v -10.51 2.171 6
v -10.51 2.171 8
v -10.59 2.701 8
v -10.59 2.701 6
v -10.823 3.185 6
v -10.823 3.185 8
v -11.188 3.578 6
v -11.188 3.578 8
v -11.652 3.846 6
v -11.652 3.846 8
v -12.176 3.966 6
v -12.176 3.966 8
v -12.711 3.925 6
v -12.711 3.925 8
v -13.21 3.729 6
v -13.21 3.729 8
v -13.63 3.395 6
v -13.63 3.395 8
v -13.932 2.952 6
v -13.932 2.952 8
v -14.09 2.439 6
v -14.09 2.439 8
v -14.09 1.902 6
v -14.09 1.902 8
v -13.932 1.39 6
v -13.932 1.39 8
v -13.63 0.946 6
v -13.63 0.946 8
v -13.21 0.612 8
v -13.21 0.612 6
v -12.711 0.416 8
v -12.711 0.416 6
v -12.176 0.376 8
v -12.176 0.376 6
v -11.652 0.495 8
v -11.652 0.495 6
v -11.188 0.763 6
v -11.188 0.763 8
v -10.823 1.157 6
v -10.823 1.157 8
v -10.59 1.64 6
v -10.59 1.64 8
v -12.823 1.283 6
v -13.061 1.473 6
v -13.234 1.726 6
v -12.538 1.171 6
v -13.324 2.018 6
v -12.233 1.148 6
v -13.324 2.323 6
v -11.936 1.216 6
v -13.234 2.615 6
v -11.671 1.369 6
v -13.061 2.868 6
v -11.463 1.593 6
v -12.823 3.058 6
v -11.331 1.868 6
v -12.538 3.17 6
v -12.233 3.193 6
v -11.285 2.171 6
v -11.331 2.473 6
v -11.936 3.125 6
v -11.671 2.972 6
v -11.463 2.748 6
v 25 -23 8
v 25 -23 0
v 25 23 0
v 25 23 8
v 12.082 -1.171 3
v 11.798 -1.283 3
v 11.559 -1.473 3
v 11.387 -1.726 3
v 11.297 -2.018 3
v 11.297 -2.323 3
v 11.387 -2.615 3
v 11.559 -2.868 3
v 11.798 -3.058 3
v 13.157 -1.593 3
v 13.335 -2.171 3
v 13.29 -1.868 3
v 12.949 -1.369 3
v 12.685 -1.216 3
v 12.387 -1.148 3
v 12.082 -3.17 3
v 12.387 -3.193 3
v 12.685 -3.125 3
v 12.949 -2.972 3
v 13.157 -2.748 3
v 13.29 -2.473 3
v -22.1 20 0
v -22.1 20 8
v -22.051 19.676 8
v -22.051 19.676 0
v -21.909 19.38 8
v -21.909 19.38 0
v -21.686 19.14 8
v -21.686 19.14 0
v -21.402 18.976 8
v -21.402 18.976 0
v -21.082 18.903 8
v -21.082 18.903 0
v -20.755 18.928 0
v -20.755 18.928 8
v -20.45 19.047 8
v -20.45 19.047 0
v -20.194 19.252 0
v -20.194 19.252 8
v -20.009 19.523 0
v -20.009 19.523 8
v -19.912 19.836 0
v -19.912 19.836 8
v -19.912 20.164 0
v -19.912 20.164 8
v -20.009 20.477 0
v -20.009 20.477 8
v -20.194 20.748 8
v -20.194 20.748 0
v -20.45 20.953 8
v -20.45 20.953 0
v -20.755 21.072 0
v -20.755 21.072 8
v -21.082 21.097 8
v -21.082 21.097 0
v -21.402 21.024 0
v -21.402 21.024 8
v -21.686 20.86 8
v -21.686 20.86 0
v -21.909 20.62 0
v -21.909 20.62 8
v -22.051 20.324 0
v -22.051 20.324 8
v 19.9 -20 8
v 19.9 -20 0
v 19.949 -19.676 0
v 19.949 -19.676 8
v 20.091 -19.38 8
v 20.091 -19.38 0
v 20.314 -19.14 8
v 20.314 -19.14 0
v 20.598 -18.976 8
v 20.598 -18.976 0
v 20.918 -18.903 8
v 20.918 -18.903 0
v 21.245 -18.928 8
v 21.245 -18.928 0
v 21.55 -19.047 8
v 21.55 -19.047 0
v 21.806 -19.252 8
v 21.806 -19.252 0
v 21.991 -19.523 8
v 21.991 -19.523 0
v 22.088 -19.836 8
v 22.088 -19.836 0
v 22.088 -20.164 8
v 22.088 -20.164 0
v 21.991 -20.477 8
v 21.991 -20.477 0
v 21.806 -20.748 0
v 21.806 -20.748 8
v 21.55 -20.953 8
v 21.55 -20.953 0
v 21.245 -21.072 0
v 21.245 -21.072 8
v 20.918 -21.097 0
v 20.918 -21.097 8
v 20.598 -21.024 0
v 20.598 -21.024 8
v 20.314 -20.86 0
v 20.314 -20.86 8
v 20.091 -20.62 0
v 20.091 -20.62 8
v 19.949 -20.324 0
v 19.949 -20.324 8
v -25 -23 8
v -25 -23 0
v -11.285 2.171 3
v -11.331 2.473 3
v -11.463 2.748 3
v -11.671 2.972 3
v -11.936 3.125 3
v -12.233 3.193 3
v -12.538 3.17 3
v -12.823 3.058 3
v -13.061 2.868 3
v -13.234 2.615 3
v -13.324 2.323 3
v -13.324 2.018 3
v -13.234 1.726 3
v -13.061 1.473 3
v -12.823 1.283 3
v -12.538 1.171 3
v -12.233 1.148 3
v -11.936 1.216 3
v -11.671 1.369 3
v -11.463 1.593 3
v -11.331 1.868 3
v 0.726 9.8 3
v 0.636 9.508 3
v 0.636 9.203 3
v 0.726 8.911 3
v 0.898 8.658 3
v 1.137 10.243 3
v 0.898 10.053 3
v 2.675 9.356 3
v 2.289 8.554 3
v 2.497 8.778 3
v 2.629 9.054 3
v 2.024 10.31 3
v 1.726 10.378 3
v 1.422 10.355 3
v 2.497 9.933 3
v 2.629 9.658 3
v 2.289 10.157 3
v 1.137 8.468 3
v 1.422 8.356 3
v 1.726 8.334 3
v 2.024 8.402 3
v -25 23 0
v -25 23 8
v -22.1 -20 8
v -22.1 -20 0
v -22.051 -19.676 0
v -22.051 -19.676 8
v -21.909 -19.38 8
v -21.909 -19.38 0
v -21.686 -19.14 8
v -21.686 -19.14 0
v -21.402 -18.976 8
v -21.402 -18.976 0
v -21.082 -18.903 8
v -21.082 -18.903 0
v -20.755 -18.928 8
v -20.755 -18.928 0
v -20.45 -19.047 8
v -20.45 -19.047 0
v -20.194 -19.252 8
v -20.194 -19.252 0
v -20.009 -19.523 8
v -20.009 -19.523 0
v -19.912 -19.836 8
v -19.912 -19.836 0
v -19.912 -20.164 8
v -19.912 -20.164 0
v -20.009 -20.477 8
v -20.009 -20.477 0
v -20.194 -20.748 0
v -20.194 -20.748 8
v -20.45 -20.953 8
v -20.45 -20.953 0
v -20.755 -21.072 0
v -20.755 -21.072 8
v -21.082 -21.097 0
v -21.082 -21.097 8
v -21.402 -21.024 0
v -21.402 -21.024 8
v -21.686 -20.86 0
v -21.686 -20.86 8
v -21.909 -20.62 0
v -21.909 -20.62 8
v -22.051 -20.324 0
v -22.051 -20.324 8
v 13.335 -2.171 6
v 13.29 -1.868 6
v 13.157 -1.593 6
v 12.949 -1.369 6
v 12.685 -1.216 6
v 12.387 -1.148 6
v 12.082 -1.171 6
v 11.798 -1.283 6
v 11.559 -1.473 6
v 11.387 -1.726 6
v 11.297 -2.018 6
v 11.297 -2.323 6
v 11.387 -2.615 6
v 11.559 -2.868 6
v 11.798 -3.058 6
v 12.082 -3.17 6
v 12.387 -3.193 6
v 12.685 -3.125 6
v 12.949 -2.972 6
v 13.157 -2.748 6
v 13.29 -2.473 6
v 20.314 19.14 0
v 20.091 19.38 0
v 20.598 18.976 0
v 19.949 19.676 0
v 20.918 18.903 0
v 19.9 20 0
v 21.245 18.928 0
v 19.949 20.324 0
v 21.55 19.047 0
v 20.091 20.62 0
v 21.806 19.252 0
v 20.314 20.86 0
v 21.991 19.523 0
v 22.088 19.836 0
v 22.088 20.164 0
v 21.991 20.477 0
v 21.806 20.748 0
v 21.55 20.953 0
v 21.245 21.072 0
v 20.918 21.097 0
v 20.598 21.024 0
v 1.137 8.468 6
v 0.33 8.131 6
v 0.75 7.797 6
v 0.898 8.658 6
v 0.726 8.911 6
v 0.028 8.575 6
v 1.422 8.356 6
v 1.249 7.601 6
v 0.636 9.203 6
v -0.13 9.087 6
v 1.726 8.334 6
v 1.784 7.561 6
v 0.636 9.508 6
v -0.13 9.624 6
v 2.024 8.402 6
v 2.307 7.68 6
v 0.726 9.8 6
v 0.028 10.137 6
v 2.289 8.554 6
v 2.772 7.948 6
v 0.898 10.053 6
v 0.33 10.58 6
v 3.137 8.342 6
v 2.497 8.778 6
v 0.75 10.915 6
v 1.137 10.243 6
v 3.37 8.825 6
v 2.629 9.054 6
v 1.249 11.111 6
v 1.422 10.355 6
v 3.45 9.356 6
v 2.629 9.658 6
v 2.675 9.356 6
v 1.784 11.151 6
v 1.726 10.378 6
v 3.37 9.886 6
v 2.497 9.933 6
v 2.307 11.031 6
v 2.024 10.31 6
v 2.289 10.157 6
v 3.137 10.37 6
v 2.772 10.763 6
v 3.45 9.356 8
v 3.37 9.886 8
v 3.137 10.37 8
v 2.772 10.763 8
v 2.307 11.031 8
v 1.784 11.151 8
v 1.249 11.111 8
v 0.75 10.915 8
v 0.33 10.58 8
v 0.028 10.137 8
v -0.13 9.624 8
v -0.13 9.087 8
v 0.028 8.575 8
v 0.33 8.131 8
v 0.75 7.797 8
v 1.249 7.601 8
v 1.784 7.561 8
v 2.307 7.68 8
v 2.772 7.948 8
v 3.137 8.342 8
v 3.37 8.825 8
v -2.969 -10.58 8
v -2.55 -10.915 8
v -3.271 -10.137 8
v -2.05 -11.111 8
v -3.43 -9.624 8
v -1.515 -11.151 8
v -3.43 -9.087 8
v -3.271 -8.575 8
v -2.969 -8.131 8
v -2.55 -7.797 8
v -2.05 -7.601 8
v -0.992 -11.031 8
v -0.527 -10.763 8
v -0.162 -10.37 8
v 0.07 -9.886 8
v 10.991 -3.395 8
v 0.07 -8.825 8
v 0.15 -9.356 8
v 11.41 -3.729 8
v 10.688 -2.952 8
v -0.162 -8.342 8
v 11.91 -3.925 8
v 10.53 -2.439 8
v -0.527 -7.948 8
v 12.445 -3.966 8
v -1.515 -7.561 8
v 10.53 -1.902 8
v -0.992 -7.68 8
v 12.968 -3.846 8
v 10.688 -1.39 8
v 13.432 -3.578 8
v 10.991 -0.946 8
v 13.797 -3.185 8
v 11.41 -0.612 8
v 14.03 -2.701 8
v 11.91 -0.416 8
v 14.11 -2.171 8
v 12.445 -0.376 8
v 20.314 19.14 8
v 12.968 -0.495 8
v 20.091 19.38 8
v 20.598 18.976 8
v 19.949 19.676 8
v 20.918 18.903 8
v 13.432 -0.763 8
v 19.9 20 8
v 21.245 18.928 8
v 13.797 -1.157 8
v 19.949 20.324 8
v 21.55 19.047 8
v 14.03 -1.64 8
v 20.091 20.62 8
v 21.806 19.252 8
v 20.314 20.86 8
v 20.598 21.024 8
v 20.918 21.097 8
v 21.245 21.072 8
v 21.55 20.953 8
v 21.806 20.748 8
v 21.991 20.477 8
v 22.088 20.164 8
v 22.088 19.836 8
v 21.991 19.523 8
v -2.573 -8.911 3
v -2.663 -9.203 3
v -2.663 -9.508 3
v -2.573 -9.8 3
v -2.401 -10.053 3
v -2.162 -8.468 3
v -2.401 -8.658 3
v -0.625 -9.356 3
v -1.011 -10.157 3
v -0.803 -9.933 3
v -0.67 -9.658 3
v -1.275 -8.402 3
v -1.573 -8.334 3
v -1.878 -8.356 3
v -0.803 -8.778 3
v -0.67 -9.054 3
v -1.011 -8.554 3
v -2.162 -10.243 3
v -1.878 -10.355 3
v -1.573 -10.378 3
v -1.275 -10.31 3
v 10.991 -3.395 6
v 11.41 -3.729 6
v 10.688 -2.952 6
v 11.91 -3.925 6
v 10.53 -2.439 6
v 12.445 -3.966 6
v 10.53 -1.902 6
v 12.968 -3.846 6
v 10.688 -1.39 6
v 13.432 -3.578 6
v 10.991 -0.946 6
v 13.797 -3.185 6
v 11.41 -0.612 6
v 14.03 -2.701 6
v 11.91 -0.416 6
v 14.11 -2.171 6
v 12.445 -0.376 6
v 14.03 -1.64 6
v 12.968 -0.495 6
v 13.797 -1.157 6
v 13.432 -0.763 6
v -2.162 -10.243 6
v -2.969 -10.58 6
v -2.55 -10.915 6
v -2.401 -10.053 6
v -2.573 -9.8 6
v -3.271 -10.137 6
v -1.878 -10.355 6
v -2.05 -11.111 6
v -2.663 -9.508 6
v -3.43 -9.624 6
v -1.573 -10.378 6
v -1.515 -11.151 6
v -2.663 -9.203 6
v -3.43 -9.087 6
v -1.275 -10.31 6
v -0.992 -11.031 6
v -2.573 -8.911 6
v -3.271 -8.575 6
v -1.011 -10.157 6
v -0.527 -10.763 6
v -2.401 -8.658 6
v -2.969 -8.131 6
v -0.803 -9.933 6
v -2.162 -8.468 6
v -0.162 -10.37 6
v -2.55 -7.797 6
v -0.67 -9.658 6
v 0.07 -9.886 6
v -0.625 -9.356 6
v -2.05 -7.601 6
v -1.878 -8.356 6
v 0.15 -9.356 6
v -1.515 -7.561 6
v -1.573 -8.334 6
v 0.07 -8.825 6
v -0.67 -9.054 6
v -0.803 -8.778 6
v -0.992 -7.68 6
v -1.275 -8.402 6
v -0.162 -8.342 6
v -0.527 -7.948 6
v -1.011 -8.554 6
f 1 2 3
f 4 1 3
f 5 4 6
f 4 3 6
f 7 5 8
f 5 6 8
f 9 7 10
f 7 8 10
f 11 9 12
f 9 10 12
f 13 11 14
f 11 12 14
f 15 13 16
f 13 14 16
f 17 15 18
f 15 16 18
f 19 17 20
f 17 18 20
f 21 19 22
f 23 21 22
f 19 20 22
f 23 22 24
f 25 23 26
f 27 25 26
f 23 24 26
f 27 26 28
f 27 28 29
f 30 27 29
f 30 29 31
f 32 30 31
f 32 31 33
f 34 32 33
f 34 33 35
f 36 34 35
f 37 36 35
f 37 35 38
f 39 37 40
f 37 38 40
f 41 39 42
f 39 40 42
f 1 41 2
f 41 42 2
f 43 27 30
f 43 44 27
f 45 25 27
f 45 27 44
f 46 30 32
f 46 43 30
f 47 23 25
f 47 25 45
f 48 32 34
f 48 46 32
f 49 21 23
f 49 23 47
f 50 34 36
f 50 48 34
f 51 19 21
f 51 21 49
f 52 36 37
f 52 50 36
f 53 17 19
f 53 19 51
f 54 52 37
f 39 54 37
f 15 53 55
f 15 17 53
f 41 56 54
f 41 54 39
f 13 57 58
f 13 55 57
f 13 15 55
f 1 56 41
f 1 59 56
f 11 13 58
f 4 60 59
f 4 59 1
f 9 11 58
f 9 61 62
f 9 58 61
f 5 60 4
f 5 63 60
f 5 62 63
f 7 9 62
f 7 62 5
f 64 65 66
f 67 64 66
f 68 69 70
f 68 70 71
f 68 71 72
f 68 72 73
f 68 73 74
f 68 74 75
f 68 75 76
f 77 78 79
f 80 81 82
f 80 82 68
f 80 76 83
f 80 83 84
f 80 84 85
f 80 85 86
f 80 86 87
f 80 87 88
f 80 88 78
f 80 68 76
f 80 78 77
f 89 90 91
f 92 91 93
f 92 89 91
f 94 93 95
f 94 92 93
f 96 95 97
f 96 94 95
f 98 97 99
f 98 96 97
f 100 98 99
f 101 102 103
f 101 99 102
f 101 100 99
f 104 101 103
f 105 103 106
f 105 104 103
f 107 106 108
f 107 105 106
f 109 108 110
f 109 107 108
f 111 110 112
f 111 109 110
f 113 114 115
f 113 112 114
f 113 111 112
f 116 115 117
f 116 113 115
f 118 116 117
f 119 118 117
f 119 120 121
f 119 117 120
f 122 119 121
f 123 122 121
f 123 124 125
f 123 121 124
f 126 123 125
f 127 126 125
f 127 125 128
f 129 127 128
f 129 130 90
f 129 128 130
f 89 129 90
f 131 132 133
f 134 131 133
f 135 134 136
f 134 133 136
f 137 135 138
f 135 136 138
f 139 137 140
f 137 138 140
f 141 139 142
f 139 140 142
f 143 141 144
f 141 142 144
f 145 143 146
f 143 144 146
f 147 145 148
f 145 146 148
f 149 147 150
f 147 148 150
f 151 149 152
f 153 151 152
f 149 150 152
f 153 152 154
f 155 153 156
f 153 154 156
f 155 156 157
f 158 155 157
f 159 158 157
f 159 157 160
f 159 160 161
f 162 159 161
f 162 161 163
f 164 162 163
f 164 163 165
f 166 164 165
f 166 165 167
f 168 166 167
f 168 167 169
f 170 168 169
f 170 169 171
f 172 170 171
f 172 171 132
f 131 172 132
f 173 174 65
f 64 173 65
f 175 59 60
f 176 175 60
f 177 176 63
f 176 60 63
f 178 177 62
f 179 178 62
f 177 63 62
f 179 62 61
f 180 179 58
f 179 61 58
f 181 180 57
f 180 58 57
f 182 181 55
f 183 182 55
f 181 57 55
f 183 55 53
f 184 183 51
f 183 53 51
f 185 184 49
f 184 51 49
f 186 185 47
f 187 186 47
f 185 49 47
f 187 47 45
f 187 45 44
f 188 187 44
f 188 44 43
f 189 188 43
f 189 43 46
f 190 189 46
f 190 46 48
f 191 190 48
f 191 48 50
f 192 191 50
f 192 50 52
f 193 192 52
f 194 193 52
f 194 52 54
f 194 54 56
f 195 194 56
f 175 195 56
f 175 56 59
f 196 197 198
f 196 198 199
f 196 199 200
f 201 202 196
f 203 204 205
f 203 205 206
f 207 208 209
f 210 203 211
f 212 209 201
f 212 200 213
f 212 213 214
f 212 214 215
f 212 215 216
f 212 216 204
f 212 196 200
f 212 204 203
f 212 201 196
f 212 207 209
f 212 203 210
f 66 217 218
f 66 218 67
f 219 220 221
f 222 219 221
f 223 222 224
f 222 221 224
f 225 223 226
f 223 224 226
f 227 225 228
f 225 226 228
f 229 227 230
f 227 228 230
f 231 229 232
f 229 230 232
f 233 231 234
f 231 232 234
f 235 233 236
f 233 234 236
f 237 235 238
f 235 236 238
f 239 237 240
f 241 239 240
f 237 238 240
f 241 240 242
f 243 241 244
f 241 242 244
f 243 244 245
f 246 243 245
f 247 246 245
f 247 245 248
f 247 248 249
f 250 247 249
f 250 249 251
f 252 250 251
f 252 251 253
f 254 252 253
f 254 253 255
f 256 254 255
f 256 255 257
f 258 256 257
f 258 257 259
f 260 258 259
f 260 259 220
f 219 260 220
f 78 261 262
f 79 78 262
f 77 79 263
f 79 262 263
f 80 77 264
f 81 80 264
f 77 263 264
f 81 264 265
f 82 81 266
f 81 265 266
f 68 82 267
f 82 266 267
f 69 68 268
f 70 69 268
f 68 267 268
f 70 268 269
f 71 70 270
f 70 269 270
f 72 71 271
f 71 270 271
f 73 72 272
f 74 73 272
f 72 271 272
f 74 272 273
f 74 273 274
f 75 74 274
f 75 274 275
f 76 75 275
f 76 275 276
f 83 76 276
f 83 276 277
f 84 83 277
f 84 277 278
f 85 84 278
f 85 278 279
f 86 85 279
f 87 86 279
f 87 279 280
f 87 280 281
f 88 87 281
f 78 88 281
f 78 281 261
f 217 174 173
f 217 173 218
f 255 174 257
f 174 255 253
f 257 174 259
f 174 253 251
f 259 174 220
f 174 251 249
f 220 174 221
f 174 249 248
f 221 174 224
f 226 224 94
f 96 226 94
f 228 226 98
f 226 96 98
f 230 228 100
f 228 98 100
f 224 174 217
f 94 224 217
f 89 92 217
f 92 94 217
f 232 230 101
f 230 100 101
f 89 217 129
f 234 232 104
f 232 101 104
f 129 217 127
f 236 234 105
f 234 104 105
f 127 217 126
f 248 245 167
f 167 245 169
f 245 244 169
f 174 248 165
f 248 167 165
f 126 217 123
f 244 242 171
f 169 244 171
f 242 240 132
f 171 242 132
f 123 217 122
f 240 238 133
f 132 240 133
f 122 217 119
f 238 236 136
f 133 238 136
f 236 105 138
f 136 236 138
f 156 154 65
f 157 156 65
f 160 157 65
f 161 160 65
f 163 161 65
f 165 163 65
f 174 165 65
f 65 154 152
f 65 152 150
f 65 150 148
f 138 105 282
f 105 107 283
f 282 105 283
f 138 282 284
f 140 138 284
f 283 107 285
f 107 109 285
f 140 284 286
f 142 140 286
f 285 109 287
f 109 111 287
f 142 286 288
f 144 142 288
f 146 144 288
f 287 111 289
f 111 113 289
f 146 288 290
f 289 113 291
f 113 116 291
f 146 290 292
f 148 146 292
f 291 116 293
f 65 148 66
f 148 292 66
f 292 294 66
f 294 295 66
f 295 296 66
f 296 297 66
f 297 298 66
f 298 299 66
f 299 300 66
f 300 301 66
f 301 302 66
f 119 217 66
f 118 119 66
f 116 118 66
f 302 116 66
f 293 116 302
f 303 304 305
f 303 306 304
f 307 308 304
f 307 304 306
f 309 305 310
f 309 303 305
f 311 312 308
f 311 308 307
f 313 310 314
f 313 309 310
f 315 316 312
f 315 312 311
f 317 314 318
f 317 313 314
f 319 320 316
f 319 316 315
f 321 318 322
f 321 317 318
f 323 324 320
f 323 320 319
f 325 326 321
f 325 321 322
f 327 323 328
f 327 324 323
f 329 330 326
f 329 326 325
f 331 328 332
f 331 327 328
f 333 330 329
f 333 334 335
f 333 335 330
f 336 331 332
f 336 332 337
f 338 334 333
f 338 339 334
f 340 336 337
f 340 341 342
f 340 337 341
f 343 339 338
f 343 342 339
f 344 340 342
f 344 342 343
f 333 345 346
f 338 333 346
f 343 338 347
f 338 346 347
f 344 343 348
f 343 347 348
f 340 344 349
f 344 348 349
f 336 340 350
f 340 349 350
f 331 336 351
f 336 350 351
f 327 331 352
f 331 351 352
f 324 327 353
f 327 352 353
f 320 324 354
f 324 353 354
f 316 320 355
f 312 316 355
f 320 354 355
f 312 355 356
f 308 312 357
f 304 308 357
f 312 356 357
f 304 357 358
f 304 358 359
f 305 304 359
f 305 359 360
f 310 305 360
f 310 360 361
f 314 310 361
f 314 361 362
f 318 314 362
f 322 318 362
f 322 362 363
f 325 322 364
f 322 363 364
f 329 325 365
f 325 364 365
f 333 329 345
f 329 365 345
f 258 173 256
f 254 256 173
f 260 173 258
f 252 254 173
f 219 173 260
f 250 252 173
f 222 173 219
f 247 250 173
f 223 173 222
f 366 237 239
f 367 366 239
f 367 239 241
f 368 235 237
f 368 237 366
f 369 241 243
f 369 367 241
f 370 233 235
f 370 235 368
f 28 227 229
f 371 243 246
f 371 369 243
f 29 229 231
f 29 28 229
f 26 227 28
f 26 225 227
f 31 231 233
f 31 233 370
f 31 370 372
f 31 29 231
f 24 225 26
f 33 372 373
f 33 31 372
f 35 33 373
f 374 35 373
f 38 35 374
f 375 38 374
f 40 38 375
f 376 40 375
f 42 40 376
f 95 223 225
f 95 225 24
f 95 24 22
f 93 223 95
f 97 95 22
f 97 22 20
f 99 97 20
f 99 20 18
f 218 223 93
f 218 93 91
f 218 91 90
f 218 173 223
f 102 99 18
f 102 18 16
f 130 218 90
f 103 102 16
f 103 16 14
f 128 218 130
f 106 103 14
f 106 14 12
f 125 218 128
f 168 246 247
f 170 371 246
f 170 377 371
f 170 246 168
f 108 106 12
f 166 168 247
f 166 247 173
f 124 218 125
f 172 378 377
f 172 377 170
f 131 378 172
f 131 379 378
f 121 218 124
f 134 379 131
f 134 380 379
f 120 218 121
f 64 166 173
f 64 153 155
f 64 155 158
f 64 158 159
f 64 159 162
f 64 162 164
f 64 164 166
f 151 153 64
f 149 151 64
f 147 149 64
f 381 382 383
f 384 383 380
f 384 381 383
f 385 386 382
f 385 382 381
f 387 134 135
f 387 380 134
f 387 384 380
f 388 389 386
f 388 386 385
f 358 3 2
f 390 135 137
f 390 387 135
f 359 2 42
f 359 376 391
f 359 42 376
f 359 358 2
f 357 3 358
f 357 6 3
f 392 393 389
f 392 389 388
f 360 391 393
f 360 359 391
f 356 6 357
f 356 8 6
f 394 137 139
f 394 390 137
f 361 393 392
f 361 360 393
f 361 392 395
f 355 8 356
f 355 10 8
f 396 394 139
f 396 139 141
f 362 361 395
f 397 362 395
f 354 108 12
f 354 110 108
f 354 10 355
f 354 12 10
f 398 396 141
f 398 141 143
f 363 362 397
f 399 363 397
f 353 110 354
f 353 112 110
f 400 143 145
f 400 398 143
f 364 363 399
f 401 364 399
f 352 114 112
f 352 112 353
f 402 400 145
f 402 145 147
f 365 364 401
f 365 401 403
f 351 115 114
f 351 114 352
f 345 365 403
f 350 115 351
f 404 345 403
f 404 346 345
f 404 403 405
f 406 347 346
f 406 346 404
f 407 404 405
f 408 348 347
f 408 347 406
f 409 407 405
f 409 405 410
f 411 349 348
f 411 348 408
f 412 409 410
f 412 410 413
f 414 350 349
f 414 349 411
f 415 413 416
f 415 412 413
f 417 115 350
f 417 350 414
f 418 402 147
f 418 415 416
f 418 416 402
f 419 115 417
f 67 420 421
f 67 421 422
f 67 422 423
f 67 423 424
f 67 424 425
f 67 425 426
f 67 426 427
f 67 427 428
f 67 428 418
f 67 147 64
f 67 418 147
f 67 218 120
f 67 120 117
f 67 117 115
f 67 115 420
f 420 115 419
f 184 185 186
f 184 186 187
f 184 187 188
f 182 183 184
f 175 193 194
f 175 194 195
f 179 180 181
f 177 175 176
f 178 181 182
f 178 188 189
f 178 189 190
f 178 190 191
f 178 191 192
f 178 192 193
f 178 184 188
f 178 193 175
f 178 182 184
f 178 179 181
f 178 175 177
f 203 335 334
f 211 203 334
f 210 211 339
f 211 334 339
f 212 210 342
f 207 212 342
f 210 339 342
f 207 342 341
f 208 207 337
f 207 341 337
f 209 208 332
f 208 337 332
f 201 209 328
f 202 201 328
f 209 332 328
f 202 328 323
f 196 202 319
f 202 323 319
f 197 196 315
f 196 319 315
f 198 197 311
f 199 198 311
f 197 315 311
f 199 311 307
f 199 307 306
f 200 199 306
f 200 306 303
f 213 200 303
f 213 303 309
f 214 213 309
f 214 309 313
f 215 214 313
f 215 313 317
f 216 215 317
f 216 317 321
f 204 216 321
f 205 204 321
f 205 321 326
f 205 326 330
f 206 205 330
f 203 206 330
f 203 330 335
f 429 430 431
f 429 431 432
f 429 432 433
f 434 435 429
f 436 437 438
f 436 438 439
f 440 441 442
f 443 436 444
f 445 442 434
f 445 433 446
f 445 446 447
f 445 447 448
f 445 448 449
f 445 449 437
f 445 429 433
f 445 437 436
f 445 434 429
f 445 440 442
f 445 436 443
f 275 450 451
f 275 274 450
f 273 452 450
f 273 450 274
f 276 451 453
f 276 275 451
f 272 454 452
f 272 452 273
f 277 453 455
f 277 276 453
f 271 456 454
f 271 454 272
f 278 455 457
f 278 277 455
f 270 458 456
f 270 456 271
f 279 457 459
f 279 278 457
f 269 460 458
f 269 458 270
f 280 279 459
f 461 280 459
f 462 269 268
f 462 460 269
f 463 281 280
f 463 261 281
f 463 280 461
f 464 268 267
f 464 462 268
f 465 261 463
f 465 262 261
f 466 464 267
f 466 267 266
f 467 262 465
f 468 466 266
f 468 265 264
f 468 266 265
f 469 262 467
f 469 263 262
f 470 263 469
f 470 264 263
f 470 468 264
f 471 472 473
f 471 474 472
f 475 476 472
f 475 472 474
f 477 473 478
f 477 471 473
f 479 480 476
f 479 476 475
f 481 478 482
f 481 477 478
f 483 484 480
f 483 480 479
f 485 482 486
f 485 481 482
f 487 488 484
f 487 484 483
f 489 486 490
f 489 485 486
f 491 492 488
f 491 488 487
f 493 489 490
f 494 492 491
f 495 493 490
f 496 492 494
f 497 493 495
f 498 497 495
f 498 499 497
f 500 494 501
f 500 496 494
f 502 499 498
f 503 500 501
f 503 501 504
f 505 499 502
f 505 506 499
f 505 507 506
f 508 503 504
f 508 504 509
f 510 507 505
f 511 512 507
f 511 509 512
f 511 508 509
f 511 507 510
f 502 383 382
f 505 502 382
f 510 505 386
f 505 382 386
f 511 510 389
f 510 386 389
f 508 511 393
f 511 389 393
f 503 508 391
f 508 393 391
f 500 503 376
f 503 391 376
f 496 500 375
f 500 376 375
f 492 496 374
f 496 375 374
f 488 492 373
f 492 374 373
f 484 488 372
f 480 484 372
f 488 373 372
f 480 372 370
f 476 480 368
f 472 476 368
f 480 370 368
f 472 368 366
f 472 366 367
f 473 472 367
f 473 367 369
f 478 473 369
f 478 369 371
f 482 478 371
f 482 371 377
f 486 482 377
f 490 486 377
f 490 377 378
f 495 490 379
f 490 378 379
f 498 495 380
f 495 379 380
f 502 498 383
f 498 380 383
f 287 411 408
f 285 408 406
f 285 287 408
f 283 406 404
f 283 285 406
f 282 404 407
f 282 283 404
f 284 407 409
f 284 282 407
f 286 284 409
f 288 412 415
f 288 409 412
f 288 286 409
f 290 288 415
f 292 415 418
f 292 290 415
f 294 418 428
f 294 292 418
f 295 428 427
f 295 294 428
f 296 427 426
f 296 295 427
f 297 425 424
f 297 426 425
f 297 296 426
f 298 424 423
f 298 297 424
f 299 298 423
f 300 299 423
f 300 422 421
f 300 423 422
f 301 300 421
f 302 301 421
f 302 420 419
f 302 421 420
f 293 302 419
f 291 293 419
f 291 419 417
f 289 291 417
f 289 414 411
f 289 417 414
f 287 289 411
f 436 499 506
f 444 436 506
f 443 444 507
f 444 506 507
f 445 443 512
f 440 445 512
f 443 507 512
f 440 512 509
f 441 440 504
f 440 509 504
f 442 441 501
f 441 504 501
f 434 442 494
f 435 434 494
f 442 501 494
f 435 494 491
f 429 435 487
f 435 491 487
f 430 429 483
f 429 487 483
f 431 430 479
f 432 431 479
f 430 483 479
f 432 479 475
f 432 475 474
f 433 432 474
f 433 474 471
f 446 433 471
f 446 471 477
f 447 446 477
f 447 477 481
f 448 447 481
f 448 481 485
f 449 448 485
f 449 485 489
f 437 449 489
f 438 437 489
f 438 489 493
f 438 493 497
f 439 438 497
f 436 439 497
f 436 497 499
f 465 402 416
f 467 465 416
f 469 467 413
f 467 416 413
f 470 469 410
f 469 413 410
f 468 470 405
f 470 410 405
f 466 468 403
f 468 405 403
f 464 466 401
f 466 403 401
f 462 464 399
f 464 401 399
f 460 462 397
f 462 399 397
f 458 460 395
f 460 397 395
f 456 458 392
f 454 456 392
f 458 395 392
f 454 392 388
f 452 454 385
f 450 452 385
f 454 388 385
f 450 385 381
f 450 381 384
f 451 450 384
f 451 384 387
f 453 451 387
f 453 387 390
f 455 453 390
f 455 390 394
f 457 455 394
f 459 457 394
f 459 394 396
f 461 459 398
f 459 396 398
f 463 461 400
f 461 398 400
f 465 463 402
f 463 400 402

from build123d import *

# Parameters (mm, degrees)
SKETCH_1_W          = 50
SKETCH_1_H          = 46
EXTRUDE_1_DEPTH     = 8
SKETCH_2_R          = 1.025
CUT_EXTRUDE_1_DEPTH = 5
SKETCH_3_R          = 1.8
CUT_EXTRUDE_2_DEPTH = 2
SKETCH_4_R          = 1.1
CUT_EXTRUDE_3_DEPTH = 24


with BuildPart() as part:
    # 草图1 → 凸台-拉伸1 (new body)
    with BuildSketch(Plane.XY):
        Rectangle(SKETCH_1_W, SKETCH_1_H)
    extrude(amount=EXTRUDE_1_DEPTH)

    # 草图2 → 切除-拉伸1 (cut)
    with BuildSketch(Plane.XY.offset(8)):
        with Locations((-1.649657688, -9.355673654)):
            Circle(SKETCH_2_R)
        with Locations((12.310096913, -2.170602221)):
            Circle(SKETCH_2_R)
        with Locations((1.649657688, 9.355673654)):
            Circle(SKETCH_2_R)
        with Locations((-12.310096913, 2.170602221)):
            Circle(SKETCH_2_R)
    extrude(amount=-CUT_EXTRUDE_1_DEPTH, mode=Mode.SUBTRACT)

    # 草图3 → 切除-拉伸2 (cut)
    with BuildSketch(Plane.XY.offset(8)):
        with Locations((-12.310096913, 2.170602221)):
            Circle(SKETCH_3_R)
        with Locations((1.649657688, 9.355673654)):
            Circle(SKETCH_3_R)
        with Locations((12.310096913, -2.170602221)):
            Circle(SKETCH_3_R)
        with Locations((-1.649657688, -9.355673654)):
            Circle(SKETCH_3_R)
    extrude(amount=-CUT_EXTRUDE_2_DEPTH, mode=Mode.SUBTRACT)

    # 草图4 → 切除-拉伸3 (cut)
    with BuildSketch(Plane(origin=(0, 0, 0), x_dir=(-1, 0, 0), z_dir=(0, 0, -1))):
        with Locations((21, -20)):
            Circle(SKETCH_4_R)
        with Locations((-21, -20)):
            Circle(SKETCH_4_R)
    cut_extrude_3 = extrude(amount=-CUT_EXTRUDE_3_DEPTH, mode=Mode.SUBTRACT)

    # 镜向1: 切除-拉伸3 across plane
    add(cut_extrude_3.mirror(Plane(origin=(0, 0, 0), x_dir=(0, 0, 1), z_dir=(0, -1, 0))), mode=Mode.SUBTRACT)


solid = part.part
